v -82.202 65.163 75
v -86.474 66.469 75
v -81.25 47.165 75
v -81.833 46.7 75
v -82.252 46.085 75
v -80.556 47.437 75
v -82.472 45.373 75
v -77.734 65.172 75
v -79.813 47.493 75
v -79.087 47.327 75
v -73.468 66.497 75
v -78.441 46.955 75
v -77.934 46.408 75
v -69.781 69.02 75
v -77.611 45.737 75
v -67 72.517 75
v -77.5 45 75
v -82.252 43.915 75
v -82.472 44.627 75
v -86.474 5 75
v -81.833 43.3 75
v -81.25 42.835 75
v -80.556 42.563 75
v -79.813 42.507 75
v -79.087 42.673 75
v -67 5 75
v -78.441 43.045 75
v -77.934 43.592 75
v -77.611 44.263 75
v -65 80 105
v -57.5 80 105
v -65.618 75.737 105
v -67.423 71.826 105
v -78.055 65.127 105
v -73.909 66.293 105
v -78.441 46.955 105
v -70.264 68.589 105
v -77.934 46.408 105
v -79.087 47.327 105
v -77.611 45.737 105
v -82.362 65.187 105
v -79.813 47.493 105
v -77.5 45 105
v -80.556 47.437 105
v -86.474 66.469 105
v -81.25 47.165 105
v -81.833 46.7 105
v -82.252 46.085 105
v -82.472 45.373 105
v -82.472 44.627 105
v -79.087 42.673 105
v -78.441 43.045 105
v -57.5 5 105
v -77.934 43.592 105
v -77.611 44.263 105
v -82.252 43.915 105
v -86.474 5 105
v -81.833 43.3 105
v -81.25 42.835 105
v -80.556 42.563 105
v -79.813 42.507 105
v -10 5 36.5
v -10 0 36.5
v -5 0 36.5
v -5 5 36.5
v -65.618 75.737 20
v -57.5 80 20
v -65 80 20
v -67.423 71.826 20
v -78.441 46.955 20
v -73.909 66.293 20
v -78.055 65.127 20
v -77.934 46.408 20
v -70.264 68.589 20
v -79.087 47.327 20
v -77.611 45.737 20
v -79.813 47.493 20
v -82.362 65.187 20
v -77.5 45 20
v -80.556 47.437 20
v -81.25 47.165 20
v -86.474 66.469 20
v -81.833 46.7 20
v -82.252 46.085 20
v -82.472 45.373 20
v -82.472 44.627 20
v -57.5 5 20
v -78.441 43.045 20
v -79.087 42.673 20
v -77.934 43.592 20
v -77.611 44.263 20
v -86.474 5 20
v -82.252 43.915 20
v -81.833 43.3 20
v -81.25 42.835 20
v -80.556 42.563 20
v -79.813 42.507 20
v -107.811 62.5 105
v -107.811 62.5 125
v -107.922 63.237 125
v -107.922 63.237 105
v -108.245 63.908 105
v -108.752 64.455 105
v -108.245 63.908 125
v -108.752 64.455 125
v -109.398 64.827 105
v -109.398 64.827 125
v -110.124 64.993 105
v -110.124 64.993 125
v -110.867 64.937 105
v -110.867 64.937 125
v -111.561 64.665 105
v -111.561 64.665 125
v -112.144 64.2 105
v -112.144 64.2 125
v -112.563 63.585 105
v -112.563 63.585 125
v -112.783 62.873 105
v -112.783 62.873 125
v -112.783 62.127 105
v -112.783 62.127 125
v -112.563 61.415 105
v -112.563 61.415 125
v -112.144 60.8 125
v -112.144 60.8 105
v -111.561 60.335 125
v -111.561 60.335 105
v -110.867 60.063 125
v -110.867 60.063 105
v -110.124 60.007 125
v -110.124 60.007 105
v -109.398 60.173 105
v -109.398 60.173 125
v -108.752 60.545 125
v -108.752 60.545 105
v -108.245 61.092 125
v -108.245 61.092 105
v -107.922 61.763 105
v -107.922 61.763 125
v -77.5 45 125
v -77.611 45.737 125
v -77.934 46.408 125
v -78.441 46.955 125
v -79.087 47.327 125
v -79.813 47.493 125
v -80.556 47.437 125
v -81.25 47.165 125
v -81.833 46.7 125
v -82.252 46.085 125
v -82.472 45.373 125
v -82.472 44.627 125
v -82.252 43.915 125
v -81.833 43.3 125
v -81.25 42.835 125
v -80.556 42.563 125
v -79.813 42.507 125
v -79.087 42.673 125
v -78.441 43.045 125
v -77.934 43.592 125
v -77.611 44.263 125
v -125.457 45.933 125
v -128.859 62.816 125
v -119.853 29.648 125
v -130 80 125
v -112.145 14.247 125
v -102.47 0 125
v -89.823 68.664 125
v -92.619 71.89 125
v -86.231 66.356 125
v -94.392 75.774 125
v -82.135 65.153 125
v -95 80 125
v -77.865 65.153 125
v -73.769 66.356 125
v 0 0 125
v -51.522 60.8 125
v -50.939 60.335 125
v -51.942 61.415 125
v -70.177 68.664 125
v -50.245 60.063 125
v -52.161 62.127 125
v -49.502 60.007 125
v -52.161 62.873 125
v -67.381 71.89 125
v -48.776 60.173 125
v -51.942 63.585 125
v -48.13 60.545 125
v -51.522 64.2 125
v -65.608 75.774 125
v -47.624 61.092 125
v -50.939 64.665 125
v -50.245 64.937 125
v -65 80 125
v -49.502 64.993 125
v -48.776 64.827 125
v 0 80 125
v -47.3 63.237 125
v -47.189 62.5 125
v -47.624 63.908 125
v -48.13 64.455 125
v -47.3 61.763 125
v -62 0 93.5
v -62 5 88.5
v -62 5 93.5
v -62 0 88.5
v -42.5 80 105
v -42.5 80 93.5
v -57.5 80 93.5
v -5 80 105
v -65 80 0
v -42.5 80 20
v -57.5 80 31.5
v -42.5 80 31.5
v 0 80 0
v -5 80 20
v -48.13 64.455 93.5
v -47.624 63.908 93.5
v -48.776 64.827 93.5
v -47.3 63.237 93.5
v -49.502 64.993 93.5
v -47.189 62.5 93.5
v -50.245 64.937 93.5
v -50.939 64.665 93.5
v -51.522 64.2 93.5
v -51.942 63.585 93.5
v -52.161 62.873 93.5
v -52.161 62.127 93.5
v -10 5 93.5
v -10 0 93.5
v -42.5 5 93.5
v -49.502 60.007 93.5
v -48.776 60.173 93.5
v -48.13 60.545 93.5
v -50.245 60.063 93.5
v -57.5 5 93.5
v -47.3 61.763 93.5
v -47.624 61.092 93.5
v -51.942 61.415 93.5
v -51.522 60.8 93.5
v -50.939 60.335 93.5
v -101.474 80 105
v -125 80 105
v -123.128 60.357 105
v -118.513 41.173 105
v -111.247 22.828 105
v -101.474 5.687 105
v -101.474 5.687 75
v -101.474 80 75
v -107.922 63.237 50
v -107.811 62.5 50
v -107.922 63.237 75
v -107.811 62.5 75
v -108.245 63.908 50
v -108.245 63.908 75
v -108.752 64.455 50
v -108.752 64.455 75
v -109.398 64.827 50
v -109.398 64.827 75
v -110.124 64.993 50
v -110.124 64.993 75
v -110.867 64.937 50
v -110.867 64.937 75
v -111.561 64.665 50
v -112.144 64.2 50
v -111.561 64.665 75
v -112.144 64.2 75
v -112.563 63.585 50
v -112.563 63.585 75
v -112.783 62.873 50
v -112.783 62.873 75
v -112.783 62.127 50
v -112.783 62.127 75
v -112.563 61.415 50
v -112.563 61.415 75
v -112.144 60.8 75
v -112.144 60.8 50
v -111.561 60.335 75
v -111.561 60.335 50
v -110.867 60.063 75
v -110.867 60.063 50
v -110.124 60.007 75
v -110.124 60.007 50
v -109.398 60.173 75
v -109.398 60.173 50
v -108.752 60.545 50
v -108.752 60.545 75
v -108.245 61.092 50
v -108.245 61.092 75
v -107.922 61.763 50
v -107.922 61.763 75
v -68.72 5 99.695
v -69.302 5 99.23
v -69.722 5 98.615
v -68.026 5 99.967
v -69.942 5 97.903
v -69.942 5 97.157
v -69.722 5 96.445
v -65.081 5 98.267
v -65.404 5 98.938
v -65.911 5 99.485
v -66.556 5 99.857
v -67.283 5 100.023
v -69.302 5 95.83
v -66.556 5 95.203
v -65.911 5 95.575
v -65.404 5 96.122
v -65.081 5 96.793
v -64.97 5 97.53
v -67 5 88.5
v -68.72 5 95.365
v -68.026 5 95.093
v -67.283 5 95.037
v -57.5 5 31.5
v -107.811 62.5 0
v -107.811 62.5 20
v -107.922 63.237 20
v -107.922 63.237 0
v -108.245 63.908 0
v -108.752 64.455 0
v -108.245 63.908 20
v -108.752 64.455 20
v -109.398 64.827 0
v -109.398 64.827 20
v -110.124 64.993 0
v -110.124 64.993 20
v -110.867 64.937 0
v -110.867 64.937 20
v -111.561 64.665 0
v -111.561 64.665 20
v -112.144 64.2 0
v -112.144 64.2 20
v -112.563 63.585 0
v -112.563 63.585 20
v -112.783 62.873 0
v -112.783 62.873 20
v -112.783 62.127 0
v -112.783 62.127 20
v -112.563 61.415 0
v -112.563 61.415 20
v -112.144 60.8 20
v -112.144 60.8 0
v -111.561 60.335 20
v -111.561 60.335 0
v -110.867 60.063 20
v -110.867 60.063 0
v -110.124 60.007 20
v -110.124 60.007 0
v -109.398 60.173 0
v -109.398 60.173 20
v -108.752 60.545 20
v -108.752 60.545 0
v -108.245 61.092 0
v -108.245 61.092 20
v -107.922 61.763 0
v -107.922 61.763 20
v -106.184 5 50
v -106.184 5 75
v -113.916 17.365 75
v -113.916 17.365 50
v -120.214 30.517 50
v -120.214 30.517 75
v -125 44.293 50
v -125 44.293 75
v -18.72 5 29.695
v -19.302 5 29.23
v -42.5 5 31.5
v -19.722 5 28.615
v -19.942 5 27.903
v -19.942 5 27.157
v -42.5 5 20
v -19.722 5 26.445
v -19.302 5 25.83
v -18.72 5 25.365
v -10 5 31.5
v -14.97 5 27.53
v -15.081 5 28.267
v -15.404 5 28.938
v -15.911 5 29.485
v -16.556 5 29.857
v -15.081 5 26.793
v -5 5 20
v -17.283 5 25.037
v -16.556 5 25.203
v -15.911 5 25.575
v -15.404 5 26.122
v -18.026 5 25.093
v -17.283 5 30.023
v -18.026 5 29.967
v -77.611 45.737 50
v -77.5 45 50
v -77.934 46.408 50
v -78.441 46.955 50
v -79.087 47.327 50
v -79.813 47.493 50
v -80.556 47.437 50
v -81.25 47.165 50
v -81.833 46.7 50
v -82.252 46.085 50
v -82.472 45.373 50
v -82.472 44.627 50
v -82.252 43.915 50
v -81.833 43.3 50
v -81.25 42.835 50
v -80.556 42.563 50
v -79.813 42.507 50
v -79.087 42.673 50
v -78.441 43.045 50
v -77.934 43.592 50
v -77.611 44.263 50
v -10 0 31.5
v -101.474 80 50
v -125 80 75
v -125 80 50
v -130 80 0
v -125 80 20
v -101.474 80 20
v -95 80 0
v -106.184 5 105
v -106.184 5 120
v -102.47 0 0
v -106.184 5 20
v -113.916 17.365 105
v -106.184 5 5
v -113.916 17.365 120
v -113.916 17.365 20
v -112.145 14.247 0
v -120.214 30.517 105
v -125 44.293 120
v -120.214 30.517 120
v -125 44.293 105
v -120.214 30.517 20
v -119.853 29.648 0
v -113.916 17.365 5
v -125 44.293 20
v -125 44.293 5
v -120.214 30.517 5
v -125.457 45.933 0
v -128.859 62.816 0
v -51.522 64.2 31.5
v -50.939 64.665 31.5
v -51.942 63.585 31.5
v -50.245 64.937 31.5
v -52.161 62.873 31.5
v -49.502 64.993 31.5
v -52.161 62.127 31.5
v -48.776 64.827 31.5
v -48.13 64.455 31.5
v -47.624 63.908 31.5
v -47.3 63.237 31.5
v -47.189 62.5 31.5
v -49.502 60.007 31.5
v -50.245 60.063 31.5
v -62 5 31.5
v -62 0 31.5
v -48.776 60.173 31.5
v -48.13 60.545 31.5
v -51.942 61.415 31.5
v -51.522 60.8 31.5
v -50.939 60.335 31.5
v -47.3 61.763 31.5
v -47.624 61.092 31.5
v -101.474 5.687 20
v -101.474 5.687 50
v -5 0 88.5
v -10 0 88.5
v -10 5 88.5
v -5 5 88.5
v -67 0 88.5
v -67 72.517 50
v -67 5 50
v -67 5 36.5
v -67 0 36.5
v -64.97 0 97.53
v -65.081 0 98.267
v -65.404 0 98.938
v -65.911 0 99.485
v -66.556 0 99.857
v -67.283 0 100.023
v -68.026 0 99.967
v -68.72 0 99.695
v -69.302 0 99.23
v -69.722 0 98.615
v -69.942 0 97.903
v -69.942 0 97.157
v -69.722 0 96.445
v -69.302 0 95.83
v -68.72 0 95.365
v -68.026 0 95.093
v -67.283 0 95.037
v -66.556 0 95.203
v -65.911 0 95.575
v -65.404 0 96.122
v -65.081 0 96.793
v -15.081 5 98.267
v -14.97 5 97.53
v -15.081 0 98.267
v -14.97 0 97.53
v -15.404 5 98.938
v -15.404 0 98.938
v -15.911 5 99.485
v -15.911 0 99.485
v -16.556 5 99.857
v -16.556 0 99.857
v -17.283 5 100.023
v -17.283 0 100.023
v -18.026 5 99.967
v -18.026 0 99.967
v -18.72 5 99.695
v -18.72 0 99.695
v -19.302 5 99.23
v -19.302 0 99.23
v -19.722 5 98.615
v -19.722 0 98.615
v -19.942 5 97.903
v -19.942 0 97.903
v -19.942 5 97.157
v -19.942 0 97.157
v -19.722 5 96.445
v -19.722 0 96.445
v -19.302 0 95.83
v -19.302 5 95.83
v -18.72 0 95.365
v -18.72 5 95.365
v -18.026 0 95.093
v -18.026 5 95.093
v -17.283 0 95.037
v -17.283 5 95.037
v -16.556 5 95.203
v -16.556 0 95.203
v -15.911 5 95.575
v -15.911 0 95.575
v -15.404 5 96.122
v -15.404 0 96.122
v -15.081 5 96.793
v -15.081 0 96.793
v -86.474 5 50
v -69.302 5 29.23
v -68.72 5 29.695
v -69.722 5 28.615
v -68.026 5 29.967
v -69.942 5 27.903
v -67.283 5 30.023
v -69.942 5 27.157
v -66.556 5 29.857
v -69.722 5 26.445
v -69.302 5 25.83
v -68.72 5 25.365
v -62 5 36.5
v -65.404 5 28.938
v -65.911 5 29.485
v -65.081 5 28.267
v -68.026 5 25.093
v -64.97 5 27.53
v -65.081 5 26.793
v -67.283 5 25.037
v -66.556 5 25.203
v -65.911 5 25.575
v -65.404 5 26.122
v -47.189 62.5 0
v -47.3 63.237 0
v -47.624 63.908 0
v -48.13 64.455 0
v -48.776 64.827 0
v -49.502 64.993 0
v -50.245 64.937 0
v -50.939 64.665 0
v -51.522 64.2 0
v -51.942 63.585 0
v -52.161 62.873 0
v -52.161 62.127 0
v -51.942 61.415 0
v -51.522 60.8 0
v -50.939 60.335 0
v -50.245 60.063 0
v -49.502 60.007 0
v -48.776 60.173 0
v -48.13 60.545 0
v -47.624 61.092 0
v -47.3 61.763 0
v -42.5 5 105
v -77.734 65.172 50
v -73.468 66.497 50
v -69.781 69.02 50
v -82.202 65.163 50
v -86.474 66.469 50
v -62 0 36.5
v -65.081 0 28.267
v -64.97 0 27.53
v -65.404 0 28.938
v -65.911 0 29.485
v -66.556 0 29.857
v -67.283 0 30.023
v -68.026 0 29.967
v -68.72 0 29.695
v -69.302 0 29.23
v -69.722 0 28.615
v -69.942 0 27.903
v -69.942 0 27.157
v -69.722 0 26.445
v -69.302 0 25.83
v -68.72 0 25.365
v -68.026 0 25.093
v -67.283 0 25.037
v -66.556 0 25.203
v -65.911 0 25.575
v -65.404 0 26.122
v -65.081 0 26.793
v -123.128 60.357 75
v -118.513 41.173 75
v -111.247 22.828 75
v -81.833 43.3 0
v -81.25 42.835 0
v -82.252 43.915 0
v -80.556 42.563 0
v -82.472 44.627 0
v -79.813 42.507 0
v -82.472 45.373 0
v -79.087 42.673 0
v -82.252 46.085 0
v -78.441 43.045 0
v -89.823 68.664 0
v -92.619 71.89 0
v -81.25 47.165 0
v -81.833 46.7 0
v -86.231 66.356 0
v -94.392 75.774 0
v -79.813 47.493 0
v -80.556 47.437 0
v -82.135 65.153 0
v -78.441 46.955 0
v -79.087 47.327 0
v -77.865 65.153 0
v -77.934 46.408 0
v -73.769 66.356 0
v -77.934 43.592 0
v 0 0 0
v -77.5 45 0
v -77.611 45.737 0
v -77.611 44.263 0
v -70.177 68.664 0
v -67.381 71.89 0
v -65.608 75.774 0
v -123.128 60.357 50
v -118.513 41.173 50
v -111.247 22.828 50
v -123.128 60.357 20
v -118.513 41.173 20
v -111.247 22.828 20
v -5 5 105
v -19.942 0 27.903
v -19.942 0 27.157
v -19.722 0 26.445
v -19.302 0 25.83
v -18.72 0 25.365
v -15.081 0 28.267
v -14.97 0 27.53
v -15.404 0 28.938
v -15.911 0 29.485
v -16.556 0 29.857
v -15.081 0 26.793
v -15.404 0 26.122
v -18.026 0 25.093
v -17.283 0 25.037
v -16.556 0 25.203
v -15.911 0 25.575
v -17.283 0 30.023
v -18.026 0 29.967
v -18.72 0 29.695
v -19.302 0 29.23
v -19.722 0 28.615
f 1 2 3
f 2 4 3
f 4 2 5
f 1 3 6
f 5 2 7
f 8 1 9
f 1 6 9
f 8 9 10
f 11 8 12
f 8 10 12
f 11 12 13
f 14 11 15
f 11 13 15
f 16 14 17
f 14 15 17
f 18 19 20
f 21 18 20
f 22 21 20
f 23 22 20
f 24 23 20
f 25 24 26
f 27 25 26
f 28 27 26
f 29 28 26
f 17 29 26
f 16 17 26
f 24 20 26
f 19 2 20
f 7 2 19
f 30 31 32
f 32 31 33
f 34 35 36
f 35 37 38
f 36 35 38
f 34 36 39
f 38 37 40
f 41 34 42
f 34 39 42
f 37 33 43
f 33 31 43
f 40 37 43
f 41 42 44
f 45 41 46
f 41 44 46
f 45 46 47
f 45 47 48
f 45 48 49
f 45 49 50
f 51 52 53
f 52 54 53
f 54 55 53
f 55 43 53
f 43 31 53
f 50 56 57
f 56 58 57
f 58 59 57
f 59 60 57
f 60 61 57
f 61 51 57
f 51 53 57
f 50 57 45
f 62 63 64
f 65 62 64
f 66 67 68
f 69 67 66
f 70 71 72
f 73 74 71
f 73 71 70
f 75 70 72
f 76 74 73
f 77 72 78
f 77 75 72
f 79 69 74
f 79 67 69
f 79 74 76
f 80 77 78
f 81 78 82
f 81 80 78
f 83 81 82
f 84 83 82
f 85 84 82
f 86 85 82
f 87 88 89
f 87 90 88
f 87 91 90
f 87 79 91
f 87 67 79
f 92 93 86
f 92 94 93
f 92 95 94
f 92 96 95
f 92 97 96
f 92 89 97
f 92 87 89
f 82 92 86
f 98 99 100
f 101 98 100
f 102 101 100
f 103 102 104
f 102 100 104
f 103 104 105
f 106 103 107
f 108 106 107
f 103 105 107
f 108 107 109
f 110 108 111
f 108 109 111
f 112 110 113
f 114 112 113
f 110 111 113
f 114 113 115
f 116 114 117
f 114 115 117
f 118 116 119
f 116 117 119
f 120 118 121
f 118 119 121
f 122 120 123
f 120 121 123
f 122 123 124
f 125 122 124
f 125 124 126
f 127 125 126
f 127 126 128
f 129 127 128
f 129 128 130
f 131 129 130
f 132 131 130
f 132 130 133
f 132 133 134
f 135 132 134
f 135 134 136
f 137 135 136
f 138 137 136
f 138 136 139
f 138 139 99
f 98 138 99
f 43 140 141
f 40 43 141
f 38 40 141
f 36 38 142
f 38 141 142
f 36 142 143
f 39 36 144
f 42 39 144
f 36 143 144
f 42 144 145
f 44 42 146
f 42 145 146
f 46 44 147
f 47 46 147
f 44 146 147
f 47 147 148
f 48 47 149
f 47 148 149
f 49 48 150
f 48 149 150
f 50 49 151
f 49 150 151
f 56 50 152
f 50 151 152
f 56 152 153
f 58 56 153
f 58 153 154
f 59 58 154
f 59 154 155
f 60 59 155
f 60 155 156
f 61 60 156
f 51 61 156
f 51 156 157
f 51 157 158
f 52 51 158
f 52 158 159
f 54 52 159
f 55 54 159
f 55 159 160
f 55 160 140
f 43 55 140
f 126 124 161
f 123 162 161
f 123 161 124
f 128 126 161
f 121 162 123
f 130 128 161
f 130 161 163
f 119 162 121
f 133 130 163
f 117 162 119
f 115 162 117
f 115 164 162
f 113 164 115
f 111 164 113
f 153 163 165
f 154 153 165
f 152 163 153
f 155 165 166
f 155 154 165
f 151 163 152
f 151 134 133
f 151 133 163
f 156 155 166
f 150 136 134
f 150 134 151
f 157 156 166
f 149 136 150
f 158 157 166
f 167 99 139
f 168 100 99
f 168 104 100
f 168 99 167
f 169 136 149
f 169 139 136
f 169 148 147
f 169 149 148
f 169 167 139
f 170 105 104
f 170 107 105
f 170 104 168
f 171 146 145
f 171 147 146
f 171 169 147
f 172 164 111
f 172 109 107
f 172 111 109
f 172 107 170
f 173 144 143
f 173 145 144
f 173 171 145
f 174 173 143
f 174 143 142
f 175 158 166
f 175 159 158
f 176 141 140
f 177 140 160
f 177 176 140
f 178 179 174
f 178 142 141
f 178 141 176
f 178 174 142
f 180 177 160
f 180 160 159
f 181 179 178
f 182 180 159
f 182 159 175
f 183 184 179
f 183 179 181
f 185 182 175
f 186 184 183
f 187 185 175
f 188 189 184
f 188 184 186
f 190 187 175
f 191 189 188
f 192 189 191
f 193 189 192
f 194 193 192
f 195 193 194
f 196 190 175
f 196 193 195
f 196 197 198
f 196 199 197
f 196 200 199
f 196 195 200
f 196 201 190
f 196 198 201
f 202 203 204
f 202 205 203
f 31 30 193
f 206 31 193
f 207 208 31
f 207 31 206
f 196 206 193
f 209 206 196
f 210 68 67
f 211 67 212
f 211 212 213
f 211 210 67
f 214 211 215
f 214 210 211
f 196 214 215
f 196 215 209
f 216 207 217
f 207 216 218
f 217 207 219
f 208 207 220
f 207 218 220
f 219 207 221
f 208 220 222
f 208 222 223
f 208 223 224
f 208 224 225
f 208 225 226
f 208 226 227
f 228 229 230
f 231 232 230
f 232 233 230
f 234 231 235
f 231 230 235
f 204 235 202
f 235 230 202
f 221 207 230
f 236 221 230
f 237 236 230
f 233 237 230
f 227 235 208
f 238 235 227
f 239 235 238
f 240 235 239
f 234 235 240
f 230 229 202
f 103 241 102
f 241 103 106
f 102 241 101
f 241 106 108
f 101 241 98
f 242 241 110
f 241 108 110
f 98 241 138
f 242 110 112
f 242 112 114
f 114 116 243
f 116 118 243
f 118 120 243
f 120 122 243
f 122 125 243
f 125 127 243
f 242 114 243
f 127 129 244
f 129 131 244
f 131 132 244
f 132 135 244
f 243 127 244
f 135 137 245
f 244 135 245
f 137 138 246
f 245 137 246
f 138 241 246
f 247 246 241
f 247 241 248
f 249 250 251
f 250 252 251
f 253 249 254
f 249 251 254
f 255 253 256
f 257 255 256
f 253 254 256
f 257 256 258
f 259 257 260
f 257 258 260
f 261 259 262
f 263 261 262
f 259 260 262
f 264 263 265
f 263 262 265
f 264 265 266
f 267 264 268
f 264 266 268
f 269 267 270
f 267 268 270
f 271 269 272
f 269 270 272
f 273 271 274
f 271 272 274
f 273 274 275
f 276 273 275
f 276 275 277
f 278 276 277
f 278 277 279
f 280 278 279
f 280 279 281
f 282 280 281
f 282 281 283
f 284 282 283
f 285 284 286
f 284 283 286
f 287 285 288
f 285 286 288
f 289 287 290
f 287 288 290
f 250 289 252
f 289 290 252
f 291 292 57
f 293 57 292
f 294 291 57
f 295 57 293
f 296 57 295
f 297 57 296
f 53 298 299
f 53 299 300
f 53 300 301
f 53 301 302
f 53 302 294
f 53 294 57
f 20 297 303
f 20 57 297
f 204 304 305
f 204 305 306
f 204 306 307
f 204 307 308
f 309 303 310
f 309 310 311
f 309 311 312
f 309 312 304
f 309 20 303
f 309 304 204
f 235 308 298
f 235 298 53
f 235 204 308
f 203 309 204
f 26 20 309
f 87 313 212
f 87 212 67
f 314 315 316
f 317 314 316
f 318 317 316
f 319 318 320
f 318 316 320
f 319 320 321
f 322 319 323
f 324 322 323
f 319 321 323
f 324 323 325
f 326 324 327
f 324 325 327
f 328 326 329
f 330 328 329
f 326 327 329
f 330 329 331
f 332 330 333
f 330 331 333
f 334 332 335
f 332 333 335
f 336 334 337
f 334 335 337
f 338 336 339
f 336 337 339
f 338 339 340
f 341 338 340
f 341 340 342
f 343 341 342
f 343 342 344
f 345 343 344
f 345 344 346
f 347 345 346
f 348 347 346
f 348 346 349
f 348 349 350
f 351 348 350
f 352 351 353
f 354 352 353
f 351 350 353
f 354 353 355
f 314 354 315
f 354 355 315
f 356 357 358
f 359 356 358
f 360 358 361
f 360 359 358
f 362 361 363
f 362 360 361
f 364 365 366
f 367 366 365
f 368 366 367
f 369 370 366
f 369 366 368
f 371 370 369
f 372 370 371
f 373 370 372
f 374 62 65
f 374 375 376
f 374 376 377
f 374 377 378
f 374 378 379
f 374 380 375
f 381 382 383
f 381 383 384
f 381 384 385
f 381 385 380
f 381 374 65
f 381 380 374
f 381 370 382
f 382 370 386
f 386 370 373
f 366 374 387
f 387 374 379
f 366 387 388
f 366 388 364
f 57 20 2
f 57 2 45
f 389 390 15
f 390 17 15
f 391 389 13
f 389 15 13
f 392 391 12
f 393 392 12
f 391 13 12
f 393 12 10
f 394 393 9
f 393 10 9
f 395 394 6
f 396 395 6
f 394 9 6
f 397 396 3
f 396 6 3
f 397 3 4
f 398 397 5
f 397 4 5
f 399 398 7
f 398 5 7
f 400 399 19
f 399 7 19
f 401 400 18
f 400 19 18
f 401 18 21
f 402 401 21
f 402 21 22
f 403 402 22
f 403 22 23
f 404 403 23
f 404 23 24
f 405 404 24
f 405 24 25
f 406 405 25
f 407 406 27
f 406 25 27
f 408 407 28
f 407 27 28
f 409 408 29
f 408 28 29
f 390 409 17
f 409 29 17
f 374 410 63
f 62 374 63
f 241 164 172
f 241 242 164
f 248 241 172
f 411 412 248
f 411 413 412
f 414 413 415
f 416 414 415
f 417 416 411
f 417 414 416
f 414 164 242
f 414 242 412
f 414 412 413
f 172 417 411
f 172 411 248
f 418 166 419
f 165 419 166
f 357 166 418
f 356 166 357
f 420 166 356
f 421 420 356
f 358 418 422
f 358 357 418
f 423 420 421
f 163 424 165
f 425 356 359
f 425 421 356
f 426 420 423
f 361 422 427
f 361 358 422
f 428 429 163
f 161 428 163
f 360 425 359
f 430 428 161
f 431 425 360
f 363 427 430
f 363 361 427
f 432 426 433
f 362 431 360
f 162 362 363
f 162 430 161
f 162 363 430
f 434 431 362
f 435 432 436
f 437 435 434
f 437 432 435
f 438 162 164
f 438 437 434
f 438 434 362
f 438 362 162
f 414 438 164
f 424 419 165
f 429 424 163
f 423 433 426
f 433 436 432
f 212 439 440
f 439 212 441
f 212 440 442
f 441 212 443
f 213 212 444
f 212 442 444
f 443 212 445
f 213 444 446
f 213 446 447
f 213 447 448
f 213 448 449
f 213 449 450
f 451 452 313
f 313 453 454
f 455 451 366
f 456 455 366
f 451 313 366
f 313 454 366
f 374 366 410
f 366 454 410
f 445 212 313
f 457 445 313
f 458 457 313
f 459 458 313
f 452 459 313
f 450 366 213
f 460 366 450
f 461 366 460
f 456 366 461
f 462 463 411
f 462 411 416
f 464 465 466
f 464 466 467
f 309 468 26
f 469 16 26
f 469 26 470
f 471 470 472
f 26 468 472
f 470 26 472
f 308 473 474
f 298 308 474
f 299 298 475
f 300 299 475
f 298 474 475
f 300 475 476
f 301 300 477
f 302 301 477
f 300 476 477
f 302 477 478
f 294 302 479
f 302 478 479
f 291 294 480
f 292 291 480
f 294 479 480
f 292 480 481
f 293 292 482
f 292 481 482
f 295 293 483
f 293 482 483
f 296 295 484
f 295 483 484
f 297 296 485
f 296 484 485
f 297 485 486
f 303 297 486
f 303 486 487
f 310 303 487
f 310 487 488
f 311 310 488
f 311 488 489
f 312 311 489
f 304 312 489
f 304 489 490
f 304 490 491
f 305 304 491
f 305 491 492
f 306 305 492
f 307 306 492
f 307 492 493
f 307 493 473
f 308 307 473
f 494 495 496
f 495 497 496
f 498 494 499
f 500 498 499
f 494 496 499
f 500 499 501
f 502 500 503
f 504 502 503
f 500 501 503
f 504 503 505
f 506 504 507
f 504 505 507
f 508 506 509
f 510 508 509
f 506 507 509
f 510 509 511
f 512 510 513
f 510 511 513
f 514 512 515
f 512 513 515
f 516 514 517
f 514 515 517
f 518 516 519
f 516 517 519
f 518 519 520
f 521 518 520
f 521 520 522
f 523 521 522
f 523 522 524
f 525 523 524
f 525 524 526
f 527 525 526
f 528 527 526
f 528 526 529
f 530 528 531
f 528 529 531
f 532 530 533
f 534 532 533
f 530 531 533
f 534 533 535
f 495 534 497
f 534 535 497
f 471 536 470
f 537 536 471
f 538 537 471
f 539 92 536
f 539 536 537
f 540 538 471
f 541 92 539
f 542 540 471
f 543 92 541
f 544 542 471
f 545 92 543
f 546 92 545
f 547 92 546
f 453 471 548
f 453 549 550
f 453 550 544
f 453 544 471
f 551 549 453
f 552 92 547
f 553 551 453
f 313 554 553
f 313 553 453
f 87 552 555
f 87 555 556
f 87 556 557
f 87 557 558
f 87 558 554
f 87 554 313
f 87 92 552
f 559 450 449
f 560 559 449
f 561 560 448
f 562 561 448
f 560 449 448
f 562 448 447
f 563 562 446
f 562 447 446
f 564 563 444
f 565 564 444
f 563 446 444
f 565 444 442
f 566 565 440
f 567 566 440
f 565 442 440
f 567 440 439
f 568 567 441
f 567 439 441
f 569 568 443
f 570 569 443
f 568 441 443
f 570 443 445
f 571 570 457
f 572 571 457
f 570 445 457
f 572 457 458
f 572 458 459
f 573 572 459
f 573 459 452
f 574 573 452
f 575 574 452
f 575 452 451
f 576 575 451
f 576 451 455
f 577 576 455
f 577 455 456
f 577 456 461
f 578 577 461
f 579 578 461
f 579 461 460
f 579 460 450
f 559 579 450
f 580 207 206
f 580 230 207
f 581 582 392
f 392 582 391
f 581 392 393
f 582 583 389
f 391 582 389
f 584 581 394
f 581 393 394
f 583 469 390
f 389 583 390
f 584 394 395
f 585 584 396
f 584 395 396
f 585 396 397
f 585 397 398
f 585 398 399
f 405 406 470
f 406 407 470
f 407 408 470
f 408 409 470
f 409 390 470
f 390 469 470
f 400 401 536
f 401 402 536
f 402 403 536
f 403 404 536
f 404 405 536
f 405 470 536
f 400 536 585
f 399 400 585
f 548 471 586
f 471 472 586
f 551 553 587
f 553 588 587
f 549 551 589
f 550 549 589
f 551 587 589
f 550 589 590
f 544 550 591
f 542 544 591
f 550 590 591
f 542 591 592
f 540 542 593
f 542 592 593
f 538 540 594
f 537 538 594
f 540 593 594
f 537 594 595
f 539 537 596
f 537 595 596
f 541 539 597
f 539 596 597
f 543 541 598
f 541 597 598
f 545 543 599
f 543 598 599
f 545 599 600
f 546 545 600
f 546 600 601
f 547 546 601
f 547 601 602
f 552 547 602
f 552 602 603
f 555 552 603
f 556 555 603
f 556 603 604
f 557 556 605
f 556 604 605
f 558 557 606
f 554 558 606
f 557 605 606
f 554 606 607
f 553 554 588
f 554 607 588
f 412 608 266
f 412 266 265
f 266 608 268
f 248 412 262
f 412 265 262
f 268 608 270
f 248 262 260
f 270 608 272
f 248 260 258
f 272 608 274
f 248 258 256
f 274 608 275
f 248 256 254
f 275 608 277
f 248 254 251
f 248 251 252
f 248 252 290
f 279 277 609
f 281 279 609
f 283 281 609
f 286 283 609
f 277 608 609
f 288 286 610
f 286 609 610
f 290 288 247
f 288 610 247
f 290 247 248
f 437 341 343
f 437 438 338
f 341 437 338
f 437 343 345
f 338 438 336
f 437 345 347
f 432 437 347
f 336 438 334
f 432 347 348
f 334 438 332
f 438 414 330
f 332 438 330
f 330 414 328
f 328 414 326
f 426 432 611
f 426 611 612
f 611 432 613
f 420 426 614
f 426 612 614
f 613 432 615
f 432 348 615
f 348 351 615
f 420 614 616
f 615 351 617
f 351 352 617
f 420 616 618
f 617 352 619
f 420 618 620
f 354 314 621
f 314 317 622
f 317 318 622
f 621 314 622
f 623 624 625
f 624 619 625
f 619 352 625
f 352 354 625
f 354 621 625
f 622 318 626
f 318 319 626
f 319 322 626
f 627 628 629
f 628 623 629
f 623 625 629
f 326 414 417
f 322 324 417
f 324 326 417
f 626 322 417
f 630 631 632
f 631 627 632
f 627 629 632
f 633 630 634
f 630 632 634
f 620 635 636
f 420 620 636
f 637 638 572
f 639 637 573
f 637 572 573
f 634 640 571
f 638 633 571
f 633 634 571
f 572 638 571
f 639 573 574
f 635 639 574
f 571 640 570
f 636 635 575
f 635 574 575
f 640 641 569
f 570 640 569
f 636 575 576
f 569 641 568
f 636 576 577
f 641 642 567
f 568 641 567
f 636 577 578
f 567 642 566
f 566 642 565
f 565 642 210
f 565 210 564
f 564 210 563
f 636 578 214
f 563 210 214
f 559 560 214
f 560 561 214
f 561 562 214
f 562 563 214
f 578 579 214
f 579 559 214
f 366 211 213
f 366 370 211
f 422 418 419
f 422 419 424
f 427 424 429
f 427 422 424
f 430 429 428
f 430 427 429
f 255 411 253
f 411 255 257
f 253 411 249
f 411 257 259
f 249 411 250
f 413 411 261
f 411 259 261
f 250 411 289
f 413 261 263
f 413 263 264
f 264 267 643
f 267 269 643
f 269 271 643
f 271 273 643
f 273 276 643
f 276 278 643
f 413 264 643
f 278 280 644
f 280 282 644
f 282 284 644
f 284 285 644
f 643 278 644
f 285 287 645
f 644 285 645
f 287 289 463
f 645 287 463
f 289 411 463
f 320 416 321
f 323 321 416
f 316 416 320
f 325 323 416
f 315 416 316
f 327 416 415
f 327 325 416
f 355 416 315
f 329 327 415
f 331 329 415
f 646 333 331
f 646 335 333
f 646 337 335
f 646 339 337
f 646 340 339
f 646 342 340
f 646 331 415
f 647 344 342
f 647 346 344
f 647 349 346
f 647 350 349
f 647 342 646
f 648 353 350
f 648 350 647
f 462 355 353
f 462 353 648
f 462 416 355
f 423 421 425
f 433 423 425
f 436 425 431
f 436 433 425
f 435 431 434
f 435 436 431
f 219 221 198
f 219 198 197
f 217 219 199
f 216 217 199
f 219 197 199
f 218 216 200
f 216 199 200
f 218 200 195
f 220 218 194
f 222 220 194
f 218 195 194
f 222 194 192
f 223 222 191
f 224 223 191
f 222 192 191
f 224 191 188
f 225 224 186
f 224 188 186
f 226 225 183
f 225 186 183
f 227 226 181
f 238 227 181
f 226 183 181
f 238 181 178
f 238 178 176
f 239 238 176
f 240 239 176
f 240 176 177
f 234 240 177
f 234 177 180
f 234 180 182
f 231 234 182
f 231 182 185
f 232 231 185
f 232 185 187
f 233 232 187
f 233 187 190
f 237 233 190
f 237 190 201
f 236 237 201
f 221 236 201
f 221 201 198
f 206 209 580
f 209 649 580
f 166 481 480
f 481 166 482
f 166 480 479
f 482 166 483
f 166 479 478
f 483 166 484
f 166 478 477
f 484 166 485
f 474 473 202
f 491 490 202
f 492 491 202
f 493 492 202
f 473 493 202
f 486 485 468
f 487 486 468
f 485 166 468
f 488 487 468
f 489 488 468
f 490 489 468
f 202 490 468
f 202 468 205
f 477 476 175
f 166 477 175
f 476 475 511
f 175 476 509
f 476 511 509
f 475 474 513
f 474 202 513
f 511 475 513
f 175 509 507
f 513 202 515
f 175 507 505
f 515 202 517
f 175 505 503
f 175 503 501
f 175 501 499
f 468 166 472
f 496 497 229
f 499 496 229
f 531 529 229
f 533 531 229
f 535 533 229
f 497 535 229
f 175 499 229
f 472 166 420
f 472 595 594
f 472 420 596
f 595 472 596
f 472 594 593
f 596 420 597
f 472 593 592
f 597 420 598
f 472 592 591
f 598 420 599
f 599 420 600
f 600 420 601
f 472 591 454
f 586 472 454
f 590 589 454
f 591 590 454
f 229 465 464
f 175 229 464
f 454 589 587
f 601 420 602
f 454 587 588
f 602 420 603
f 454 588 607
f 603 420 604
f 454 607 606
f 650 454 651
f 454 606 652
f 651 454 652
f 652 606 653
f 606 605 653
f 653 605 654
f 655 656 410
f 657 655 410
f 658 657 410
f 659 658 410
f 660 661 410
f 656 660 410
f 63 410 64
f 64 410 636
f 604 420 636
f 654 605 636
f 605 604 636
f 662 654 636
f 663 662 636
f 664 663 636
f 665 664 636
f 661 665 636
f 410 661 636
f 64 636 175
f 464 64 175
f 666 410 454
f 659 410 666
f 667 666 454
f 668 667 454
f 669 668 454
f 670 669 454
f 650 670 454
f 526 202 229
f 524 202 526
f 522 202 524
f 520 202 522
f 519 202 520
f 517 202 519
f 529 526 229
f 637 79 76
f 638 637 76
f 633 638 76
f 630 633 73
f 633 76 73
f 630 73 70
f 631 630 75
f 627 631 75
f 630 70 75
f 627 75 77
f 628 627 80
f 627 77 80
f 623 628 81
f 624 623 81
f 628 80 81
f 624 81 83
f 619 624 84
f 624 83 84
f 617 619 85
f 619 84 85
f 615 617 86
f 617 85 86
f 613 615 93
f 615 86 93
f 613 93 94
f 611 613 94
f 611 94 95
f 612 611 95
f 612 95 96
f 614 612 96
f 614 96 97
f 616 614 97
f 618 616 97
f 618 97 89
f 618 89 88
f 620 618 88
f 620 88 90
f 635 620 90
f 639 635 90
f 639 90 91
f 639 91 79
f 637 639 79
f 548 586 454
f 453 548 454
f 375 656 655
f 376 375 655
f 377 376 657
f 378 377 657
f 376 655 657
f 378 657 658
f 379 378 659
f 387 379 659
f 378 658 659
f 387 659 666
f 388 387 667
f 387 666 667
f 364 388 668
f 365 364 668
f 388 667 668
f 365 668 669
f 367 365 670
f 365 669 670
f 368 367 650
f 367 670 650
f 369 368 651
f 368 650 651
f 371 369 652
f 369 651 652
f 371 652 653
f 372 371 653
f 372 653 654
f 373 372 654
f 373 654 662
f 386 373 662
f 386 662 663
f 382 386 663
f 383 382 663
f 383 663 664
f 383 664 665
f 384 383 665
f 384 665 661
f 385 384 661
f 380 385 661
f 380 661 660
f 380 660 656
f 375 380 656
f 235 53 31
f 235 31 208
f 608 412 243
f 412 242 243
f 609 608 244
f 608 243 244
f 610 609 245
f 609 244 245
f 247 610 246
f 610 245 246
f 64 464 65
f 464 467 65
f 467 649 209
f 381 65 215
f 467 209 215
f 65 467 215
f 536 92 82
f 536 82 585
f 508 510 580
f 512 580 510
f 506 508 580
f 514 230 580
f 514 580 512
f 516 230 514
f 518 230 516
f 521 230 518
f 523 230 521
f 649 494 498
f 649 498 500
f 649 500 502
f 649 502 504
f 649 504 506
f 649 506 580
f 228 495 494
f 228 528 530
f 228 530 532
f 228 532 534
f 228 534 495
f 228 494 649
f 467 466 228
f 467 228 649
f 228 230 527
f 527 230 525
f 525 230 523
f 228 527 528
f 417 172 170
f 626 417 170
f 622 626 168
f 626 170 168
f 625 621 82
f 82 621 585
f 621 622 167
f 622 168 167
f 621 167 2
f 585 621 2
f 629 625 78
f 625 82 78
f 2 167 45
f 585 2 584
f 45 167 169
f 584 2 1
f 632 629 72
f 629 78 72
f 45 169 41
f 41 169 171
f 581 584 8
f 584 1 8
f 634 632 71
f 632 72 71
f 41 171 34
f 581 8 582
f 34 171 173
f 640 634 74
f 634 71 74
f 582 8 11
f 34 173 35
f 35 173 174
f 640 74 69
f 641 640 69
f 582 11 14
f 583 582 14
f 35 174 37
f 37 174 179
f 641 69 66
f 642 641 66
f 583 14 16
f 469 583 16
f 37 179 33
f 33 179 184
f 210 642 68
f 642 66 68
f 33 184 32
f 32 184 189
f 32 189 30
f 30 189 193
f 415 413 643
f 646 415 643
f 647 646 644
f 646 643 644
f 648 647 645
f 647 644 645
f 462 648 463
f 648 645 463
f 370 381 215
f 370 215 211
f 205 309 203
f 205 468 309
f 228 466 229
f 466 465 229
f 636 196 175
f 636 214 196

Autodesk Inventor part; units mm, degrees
ref_plane "YZ Plane" through (0, 0, 0) normal (1, 0, 0) x (0, 1, 0)
ref_plane "XZ Plane" through (0, 0, 0) normal (0, 1, 0) x (-1, 0, 0)
ref_plane "XY Plane" through (0, 0, 0) normal (0, 0, 1) x (1, 0, 0)
sketch "Sketch1" plane through (0, 0, 0) normal (0, 0, 1) x (1, 0, 0)
  circle A0 centre (0, 80) radius 130 construction
  line L0 (0, -50) -> (0, 0) construction
  line L1 (0, 0) -> (-102.4695, 0) construction
  arc A1 (-130, 80) -> (-102.4695, 0) centre (0, 80) ccw
  line L2 (-130, 80) -> (0, 80)
  line L3 (0, 80) -> (0, 0)
  line L4 (-102.4695, 0) -> (0, 0)
  dimension "d0" = 260
  dimension "d1" = 50
extrude "Extrusion1" add sketch "Sketch1" along normal blind 125
sketch "Sketch6" plane through (-130, 80, 0) normal (0, 1, 0) x (1, 0, 0)
  line L0 (0, 0) -> (0, -125) projected
  line L1 (0, 0) -> (130, 0)
  line L2 (130, 0) -> (130, -125)
  line L3 (130, -125) -> (0, -125)
  line L4 (0, -125) -> (0, 0)
  line L5 (5, -120) -> (125, -120)
  line L6 (125, -120) -> (125, -5)
  line L7 (125, -5) -> (5, -5)
  line L8 (5, -5) -> (5, -120)
  point P0 (130, 0)
  dimension "d25" = 5
extrude "Extrusion5" cut sketch "Sketch6" against normal blind 75 contours L8 L7 L6 L5
sketch "Sketch7" plane through (-102.4695, 0, 0) normal (0, -1, 0) x (1, 0, 0)
  circle A0 centre (35, 97.53) radius 2.5
  circle A1 centre (85, 97.53) radius 2.5
  line L0 (0, 125) -> (102.4695, 125) projected
  line L1 (0, 0) -> (0, 125) projected
  circle A2 centre (35, 27.53) radius 2.5
  circle A3 centre (85, 27.53) radius 2.5
  line L2 (102.4695, 0) -> (102.4695, 125) projected
  dimension "d28" = 5
  dimension "d29" = 5
  dimension "d30" = 27.47
  dimension "d31" = 50
  dimension "d33" = 5
  dimension "d34" = 5
  dimension "d35" = 70
  dimension "d82" = 35
extrude "Extrusion6" cut sketch "Sketch7" against normal through all
sketch "Sketch8" plane through (0, 0, 125) normal (0, 0, 1) x (1, 0, 0)
  line L0 (0, 80) -> (-130, 80) projected
  arc A0 (-130, 80) -> (-102.4695, 0) centre (0, 80) ccw projected
  arc A1 (-130, 80) -> (-102.4695, 0) centre (9.9581, 83.4269) ccw
  line L1 (-102.4695, 0) -> (-97.4695, 0)
  line L2 (-102.4695, 0) -> (0, 0) projected
  line L3 (-130, 80) -> (-125, 80)
  arc A2 (-125, 80) -> (-97.4695, 0) centre (14.9581, 83.4269) ccw
  dimension "d40" = 5
  dimension "d41" = 5
  dimension "d42" = 140
extrude "Extrusion7" add sketch "Sketch8" against normal blind 125
sketch "Sketch11" plane through (-130, 5, 0) normal (0, 1, 0) x (1, 0, 0)
  line L0 (125, -5) -> (125, -120) projected
  line L1 (125, -50) -> (5, -50)
  line L2 (5, -50) -> (5, -65)
  line L3 (5, -65) -> (125, -65)
  line L4 (125, -65) -> (125, -50)
  line L5 (125, -60) -> (5, -60)
  line L6 (5, -60) -> (5, -75)
  line L7 (5, -75) -> (125, -75)
  line L8 (125, -75) -> (125, -60)
  line L9 (32.7619, 0) -> (32.7619, -150)
  line L10 (125, -105) -> (5, -105)
  line L11 (5, -105) -> (5, -120)
  line L12 (5, -120) -> (125, -120)
  line L13 (125, -120) -> (125, -105)
  line L14 (125, -20) -> (5, -20)
  line L15 (5, -20) -> (5, -5)
  line L16 (5, -5) -> (125, -5)
  line L17 (125, -5) -> (125, -20)
  line L18 (5, -5) -> (125, -5)
  line L19 (5, -120) -> (5, -5) projected
  line L20 (125, -120) -> (5, -120) projected
  line L21 (125, -5) -> (125, -20)
  point P0 (130, 0)
  point P1 (65, -120)
  point P2 (65, -5)
  point P3 (5, -12.5)
  point P4 (5, -57.5)
  dimension "d54" = 15
  dimension "d55" = 15
  dimension "d56" = 15
  dimension "d57" = 15
  dimension "d58" = 30
  dimension "d59" = 30
  dimension "d66" = 5
extrude "Extrusion10" add sketch "Sketch11" along normal blind 75 contours L0 L14 L9 L16 | L9 L14 L15 L16 | L0 L5 L9 L1 | L0 L3 L9 L5 | L9 L5 L2 L1 | L0 L7 L9 L3 | L9 L3 L2 L5 | L9 L7 L6 L3 | L0 L12 L9 L10 | L9 L12 L11 L10
sketch "Sketch12" plane through (-130, 5, 0) normal (0, 1, 0) x (1, 0, 0)
  line L0 (27.5305, 0) -> (130, 0) projected
  line L1 (27.5305, -125) -> (130, -125) projected
  line L2 (72.5, 0) -> (87.5, 0)
  line L3 (87.5, 0) -> (87.5, -125)
  line L4 (87.5, -125) -> (72.5, -125)
  line L5 (72.5, -125) -> (72.5, 0)
  line L6 (28.5256, 0) -> (43.5256, 0)
  line L7 (43.5256, 0) -> (43.5256, -125)
  line L8 (43.5256, -125) -> (28.5256, -125)
  line L9 (28.5256, -125) -> (28.5256, 0)
  line L10 (130, 0) -> (130, -125) projected
  dimension "d62" = 15
  dimension "d63" = 15
  dimension "d92" = 42.5
extrude "Extrusion11" add sketch "Sketch12" along normal blind 75 contours L0 L7 L1 L9 | L0 L3 L1 L5
sketch "Sketch9" plane through (0, 0, 125) normal (0, 0, 1) x (1, 0, 0)
  circle A0 centre (-80, 80) radius 15
  point P0 (0, 0)
  point P1 (0, 80)
  dimension "d45" = 30
  dimension "d46" = 80
extrude "Extrusion8" cut sketch "Sketch9" against normal through all
sketch "Sketch13" plane through (0, 0, 0) normal (0, 0, -1) x (-1, 0, 0)
  arc A0 (102.4695, 0) -> (130, 80) centre (-9.9581, 83.4269) ccw
  line L0 (130, 80) -> (130, 80)
  arc A1 (102.4695, 0) -> (130, 80) centre (0, 80) ccw projected
  line L1 (130, 80) -> (130, 80)
  line L2 (95, 80) -> (130, 80) projected
  line L3 (130, 80) -> (130, 0)
  line L4 (130, 0) -> (102.4695, 0)
  point P0 (0, 0)
  dimension "d67" = 140
extrude "Extrusion12" cut sketch "Sketch13" against normal through all contours A1 L3 L4
sketch "Sketch14" plane through (0, 0, 125) normal (0, 0, 1) x (1, 0, 0)
  line L0 (-102.4695, 0) -> (0, 0) construction
  circle A0 centre (-110.3109, 97.5) radius 2.5
  circle A1 centre (-80, 80) radius 35 construction
  circle A2 centre (-110.3109, 62.5) radius 2.5
  circle A3 centre (-80, 45) radius 2.5
  circle A4 centre (-49.6891, 62.5) radius 2.5
  circle A5 centre (-49.6891, 97.5) radius 2.5
  circle A6 centre (-80, 115) radius 2.5
  arc A7 (-95, 80) -> (-65, 80) centre (-80, 80) ccw projected
  point P0 (0, 80)
  dimension "d74" = 70
  dimension "d72" = 5
  dimension "d77" = 360
extrude "Extrusion13" cut sketch "Sketch14" against normal through all
sketch "Sketch16" plane through (-102.4695, 0, 0) normal (0, -1, 0) x (1, 0, 0)
  line L0 (35.4695, 31.5) -> (35.4695, 93.5) construction
  line L1 (97.4695, 93.5) -> (35.4695, 93.5) construction
  line L2 (35.4695, 93.5) -> (35.4695, 31.5) construction
  line L3 (35.4695, 31.5) -> (97.4695, 31.5) construction
  line L4 (97.4695, 31.5) -> (97.4695, 93.5) construction
  line L5 (0, 125) -> (102.4695, 125) projected
  line L6 (0, 0) -> (102.4695, 0) projected
  line L7 (102.4695, 0) -> (102.4695, 125) projected
  line L8 (97.4695, 93.5) -> (92.4695, 93.5) construction
  line L9 (92.4695, 93.5) -> (92.4695, 88.5) construction
  line L10 (92.4695, 88.5) -> (97.4695, 88.5) construction
  line L11 (97.4695, 88.5) -> (97.4695, 93.5) construction
  line L12 (35.4695, 31.5) -> (40.4695, 31.5) construction
  line L13 (40.4695, 31.5) -> (40.4695, 36.5) construction
  line L14 (40.4695, 36.5) -> (35.4695, 36.5) construction
  line L15 (35.4695, 36.5) -> (35.4695, 31.5) construction
  line L16 (35.4695, 93.5) -> (40.4695, 93.5) construction
  line L17 (40.4695, 93.5) -> (40.4695, 88.5) construction
  line L18 (40.4695, 88.5) -> (35.4695, 88.5) construction
  line L19 (35.4695, 88.5) -> (35.4695, 93.5) construction
  line L20 (97.4695, 31.5) -> (92.4695, 31.5) construction
  line L21 (92.4695, 31.5) -> (92.4695, 36.5) construction
  line L22 (92.4695, 36.5) -> (97.4695, 36.5) construction
  line L23 (97.4695, 36.5) -> (97.4695, 31.5) construction
  line L24 (92.4695, 93.5) -> (40.4695, 93.5)
  line L25 (40.4695, 88.5) -> (40.4695, 93.5)
  line L26 (35.4695, 88.5) -> (40.4695, 88.5)
  line L27 (35.4695, 88.5) -> (35.4695, 36.5)
  line L28 (35.4695, 36.5) -> (40.4695, 36.5)
  line L29 (40.4695, 36.5) -> (40.4695, 31.5)
  line L30 (40.4695, 31.5) -> (92.4695, 31.5)
  line L31 (92.4695, 31.5) -> (92.4695, 36.5)
  line L32 (92.4695, 36.5) -> (97.4695, 36.5)
  line L33 (97.4695, 20) -> (97.4695, 50) projected
  line L34 (97.4695, 36.5) -> (97.4695, 88.5)
  line L35 (97.4695, 75) -> (97.4695, 105) projected
  line L36 (92.4695, 88.5) -> (97.4695, 88.5)
  line L37 (92.4695, 88.5) -> (92.4695, 93.5)
  point P0 (97.4695, 62.5)
  point P1 (102.4695, 62.5)
  point P2 (66.4695, 31.5)
  point P3 (51.2348, 0)
  dimension "d100" = 62
  dimension "d101" = 62
  dimension "d102" = 5
  dimension "d103" = 5
  dimension "d104" = 5
  dimension "d105" = 5
  dimension "d106" = 5
  dimension "d107" = 5
  dimension "d108" = 5
  dimension "d109" = 5
  dimension "d110" = 5
extrude "Extrusion15" cut sketch "Sketch16" against normal through all
equation "\"d101\" = d100"
properties part number "SJ005" material "ABS Plastic"
